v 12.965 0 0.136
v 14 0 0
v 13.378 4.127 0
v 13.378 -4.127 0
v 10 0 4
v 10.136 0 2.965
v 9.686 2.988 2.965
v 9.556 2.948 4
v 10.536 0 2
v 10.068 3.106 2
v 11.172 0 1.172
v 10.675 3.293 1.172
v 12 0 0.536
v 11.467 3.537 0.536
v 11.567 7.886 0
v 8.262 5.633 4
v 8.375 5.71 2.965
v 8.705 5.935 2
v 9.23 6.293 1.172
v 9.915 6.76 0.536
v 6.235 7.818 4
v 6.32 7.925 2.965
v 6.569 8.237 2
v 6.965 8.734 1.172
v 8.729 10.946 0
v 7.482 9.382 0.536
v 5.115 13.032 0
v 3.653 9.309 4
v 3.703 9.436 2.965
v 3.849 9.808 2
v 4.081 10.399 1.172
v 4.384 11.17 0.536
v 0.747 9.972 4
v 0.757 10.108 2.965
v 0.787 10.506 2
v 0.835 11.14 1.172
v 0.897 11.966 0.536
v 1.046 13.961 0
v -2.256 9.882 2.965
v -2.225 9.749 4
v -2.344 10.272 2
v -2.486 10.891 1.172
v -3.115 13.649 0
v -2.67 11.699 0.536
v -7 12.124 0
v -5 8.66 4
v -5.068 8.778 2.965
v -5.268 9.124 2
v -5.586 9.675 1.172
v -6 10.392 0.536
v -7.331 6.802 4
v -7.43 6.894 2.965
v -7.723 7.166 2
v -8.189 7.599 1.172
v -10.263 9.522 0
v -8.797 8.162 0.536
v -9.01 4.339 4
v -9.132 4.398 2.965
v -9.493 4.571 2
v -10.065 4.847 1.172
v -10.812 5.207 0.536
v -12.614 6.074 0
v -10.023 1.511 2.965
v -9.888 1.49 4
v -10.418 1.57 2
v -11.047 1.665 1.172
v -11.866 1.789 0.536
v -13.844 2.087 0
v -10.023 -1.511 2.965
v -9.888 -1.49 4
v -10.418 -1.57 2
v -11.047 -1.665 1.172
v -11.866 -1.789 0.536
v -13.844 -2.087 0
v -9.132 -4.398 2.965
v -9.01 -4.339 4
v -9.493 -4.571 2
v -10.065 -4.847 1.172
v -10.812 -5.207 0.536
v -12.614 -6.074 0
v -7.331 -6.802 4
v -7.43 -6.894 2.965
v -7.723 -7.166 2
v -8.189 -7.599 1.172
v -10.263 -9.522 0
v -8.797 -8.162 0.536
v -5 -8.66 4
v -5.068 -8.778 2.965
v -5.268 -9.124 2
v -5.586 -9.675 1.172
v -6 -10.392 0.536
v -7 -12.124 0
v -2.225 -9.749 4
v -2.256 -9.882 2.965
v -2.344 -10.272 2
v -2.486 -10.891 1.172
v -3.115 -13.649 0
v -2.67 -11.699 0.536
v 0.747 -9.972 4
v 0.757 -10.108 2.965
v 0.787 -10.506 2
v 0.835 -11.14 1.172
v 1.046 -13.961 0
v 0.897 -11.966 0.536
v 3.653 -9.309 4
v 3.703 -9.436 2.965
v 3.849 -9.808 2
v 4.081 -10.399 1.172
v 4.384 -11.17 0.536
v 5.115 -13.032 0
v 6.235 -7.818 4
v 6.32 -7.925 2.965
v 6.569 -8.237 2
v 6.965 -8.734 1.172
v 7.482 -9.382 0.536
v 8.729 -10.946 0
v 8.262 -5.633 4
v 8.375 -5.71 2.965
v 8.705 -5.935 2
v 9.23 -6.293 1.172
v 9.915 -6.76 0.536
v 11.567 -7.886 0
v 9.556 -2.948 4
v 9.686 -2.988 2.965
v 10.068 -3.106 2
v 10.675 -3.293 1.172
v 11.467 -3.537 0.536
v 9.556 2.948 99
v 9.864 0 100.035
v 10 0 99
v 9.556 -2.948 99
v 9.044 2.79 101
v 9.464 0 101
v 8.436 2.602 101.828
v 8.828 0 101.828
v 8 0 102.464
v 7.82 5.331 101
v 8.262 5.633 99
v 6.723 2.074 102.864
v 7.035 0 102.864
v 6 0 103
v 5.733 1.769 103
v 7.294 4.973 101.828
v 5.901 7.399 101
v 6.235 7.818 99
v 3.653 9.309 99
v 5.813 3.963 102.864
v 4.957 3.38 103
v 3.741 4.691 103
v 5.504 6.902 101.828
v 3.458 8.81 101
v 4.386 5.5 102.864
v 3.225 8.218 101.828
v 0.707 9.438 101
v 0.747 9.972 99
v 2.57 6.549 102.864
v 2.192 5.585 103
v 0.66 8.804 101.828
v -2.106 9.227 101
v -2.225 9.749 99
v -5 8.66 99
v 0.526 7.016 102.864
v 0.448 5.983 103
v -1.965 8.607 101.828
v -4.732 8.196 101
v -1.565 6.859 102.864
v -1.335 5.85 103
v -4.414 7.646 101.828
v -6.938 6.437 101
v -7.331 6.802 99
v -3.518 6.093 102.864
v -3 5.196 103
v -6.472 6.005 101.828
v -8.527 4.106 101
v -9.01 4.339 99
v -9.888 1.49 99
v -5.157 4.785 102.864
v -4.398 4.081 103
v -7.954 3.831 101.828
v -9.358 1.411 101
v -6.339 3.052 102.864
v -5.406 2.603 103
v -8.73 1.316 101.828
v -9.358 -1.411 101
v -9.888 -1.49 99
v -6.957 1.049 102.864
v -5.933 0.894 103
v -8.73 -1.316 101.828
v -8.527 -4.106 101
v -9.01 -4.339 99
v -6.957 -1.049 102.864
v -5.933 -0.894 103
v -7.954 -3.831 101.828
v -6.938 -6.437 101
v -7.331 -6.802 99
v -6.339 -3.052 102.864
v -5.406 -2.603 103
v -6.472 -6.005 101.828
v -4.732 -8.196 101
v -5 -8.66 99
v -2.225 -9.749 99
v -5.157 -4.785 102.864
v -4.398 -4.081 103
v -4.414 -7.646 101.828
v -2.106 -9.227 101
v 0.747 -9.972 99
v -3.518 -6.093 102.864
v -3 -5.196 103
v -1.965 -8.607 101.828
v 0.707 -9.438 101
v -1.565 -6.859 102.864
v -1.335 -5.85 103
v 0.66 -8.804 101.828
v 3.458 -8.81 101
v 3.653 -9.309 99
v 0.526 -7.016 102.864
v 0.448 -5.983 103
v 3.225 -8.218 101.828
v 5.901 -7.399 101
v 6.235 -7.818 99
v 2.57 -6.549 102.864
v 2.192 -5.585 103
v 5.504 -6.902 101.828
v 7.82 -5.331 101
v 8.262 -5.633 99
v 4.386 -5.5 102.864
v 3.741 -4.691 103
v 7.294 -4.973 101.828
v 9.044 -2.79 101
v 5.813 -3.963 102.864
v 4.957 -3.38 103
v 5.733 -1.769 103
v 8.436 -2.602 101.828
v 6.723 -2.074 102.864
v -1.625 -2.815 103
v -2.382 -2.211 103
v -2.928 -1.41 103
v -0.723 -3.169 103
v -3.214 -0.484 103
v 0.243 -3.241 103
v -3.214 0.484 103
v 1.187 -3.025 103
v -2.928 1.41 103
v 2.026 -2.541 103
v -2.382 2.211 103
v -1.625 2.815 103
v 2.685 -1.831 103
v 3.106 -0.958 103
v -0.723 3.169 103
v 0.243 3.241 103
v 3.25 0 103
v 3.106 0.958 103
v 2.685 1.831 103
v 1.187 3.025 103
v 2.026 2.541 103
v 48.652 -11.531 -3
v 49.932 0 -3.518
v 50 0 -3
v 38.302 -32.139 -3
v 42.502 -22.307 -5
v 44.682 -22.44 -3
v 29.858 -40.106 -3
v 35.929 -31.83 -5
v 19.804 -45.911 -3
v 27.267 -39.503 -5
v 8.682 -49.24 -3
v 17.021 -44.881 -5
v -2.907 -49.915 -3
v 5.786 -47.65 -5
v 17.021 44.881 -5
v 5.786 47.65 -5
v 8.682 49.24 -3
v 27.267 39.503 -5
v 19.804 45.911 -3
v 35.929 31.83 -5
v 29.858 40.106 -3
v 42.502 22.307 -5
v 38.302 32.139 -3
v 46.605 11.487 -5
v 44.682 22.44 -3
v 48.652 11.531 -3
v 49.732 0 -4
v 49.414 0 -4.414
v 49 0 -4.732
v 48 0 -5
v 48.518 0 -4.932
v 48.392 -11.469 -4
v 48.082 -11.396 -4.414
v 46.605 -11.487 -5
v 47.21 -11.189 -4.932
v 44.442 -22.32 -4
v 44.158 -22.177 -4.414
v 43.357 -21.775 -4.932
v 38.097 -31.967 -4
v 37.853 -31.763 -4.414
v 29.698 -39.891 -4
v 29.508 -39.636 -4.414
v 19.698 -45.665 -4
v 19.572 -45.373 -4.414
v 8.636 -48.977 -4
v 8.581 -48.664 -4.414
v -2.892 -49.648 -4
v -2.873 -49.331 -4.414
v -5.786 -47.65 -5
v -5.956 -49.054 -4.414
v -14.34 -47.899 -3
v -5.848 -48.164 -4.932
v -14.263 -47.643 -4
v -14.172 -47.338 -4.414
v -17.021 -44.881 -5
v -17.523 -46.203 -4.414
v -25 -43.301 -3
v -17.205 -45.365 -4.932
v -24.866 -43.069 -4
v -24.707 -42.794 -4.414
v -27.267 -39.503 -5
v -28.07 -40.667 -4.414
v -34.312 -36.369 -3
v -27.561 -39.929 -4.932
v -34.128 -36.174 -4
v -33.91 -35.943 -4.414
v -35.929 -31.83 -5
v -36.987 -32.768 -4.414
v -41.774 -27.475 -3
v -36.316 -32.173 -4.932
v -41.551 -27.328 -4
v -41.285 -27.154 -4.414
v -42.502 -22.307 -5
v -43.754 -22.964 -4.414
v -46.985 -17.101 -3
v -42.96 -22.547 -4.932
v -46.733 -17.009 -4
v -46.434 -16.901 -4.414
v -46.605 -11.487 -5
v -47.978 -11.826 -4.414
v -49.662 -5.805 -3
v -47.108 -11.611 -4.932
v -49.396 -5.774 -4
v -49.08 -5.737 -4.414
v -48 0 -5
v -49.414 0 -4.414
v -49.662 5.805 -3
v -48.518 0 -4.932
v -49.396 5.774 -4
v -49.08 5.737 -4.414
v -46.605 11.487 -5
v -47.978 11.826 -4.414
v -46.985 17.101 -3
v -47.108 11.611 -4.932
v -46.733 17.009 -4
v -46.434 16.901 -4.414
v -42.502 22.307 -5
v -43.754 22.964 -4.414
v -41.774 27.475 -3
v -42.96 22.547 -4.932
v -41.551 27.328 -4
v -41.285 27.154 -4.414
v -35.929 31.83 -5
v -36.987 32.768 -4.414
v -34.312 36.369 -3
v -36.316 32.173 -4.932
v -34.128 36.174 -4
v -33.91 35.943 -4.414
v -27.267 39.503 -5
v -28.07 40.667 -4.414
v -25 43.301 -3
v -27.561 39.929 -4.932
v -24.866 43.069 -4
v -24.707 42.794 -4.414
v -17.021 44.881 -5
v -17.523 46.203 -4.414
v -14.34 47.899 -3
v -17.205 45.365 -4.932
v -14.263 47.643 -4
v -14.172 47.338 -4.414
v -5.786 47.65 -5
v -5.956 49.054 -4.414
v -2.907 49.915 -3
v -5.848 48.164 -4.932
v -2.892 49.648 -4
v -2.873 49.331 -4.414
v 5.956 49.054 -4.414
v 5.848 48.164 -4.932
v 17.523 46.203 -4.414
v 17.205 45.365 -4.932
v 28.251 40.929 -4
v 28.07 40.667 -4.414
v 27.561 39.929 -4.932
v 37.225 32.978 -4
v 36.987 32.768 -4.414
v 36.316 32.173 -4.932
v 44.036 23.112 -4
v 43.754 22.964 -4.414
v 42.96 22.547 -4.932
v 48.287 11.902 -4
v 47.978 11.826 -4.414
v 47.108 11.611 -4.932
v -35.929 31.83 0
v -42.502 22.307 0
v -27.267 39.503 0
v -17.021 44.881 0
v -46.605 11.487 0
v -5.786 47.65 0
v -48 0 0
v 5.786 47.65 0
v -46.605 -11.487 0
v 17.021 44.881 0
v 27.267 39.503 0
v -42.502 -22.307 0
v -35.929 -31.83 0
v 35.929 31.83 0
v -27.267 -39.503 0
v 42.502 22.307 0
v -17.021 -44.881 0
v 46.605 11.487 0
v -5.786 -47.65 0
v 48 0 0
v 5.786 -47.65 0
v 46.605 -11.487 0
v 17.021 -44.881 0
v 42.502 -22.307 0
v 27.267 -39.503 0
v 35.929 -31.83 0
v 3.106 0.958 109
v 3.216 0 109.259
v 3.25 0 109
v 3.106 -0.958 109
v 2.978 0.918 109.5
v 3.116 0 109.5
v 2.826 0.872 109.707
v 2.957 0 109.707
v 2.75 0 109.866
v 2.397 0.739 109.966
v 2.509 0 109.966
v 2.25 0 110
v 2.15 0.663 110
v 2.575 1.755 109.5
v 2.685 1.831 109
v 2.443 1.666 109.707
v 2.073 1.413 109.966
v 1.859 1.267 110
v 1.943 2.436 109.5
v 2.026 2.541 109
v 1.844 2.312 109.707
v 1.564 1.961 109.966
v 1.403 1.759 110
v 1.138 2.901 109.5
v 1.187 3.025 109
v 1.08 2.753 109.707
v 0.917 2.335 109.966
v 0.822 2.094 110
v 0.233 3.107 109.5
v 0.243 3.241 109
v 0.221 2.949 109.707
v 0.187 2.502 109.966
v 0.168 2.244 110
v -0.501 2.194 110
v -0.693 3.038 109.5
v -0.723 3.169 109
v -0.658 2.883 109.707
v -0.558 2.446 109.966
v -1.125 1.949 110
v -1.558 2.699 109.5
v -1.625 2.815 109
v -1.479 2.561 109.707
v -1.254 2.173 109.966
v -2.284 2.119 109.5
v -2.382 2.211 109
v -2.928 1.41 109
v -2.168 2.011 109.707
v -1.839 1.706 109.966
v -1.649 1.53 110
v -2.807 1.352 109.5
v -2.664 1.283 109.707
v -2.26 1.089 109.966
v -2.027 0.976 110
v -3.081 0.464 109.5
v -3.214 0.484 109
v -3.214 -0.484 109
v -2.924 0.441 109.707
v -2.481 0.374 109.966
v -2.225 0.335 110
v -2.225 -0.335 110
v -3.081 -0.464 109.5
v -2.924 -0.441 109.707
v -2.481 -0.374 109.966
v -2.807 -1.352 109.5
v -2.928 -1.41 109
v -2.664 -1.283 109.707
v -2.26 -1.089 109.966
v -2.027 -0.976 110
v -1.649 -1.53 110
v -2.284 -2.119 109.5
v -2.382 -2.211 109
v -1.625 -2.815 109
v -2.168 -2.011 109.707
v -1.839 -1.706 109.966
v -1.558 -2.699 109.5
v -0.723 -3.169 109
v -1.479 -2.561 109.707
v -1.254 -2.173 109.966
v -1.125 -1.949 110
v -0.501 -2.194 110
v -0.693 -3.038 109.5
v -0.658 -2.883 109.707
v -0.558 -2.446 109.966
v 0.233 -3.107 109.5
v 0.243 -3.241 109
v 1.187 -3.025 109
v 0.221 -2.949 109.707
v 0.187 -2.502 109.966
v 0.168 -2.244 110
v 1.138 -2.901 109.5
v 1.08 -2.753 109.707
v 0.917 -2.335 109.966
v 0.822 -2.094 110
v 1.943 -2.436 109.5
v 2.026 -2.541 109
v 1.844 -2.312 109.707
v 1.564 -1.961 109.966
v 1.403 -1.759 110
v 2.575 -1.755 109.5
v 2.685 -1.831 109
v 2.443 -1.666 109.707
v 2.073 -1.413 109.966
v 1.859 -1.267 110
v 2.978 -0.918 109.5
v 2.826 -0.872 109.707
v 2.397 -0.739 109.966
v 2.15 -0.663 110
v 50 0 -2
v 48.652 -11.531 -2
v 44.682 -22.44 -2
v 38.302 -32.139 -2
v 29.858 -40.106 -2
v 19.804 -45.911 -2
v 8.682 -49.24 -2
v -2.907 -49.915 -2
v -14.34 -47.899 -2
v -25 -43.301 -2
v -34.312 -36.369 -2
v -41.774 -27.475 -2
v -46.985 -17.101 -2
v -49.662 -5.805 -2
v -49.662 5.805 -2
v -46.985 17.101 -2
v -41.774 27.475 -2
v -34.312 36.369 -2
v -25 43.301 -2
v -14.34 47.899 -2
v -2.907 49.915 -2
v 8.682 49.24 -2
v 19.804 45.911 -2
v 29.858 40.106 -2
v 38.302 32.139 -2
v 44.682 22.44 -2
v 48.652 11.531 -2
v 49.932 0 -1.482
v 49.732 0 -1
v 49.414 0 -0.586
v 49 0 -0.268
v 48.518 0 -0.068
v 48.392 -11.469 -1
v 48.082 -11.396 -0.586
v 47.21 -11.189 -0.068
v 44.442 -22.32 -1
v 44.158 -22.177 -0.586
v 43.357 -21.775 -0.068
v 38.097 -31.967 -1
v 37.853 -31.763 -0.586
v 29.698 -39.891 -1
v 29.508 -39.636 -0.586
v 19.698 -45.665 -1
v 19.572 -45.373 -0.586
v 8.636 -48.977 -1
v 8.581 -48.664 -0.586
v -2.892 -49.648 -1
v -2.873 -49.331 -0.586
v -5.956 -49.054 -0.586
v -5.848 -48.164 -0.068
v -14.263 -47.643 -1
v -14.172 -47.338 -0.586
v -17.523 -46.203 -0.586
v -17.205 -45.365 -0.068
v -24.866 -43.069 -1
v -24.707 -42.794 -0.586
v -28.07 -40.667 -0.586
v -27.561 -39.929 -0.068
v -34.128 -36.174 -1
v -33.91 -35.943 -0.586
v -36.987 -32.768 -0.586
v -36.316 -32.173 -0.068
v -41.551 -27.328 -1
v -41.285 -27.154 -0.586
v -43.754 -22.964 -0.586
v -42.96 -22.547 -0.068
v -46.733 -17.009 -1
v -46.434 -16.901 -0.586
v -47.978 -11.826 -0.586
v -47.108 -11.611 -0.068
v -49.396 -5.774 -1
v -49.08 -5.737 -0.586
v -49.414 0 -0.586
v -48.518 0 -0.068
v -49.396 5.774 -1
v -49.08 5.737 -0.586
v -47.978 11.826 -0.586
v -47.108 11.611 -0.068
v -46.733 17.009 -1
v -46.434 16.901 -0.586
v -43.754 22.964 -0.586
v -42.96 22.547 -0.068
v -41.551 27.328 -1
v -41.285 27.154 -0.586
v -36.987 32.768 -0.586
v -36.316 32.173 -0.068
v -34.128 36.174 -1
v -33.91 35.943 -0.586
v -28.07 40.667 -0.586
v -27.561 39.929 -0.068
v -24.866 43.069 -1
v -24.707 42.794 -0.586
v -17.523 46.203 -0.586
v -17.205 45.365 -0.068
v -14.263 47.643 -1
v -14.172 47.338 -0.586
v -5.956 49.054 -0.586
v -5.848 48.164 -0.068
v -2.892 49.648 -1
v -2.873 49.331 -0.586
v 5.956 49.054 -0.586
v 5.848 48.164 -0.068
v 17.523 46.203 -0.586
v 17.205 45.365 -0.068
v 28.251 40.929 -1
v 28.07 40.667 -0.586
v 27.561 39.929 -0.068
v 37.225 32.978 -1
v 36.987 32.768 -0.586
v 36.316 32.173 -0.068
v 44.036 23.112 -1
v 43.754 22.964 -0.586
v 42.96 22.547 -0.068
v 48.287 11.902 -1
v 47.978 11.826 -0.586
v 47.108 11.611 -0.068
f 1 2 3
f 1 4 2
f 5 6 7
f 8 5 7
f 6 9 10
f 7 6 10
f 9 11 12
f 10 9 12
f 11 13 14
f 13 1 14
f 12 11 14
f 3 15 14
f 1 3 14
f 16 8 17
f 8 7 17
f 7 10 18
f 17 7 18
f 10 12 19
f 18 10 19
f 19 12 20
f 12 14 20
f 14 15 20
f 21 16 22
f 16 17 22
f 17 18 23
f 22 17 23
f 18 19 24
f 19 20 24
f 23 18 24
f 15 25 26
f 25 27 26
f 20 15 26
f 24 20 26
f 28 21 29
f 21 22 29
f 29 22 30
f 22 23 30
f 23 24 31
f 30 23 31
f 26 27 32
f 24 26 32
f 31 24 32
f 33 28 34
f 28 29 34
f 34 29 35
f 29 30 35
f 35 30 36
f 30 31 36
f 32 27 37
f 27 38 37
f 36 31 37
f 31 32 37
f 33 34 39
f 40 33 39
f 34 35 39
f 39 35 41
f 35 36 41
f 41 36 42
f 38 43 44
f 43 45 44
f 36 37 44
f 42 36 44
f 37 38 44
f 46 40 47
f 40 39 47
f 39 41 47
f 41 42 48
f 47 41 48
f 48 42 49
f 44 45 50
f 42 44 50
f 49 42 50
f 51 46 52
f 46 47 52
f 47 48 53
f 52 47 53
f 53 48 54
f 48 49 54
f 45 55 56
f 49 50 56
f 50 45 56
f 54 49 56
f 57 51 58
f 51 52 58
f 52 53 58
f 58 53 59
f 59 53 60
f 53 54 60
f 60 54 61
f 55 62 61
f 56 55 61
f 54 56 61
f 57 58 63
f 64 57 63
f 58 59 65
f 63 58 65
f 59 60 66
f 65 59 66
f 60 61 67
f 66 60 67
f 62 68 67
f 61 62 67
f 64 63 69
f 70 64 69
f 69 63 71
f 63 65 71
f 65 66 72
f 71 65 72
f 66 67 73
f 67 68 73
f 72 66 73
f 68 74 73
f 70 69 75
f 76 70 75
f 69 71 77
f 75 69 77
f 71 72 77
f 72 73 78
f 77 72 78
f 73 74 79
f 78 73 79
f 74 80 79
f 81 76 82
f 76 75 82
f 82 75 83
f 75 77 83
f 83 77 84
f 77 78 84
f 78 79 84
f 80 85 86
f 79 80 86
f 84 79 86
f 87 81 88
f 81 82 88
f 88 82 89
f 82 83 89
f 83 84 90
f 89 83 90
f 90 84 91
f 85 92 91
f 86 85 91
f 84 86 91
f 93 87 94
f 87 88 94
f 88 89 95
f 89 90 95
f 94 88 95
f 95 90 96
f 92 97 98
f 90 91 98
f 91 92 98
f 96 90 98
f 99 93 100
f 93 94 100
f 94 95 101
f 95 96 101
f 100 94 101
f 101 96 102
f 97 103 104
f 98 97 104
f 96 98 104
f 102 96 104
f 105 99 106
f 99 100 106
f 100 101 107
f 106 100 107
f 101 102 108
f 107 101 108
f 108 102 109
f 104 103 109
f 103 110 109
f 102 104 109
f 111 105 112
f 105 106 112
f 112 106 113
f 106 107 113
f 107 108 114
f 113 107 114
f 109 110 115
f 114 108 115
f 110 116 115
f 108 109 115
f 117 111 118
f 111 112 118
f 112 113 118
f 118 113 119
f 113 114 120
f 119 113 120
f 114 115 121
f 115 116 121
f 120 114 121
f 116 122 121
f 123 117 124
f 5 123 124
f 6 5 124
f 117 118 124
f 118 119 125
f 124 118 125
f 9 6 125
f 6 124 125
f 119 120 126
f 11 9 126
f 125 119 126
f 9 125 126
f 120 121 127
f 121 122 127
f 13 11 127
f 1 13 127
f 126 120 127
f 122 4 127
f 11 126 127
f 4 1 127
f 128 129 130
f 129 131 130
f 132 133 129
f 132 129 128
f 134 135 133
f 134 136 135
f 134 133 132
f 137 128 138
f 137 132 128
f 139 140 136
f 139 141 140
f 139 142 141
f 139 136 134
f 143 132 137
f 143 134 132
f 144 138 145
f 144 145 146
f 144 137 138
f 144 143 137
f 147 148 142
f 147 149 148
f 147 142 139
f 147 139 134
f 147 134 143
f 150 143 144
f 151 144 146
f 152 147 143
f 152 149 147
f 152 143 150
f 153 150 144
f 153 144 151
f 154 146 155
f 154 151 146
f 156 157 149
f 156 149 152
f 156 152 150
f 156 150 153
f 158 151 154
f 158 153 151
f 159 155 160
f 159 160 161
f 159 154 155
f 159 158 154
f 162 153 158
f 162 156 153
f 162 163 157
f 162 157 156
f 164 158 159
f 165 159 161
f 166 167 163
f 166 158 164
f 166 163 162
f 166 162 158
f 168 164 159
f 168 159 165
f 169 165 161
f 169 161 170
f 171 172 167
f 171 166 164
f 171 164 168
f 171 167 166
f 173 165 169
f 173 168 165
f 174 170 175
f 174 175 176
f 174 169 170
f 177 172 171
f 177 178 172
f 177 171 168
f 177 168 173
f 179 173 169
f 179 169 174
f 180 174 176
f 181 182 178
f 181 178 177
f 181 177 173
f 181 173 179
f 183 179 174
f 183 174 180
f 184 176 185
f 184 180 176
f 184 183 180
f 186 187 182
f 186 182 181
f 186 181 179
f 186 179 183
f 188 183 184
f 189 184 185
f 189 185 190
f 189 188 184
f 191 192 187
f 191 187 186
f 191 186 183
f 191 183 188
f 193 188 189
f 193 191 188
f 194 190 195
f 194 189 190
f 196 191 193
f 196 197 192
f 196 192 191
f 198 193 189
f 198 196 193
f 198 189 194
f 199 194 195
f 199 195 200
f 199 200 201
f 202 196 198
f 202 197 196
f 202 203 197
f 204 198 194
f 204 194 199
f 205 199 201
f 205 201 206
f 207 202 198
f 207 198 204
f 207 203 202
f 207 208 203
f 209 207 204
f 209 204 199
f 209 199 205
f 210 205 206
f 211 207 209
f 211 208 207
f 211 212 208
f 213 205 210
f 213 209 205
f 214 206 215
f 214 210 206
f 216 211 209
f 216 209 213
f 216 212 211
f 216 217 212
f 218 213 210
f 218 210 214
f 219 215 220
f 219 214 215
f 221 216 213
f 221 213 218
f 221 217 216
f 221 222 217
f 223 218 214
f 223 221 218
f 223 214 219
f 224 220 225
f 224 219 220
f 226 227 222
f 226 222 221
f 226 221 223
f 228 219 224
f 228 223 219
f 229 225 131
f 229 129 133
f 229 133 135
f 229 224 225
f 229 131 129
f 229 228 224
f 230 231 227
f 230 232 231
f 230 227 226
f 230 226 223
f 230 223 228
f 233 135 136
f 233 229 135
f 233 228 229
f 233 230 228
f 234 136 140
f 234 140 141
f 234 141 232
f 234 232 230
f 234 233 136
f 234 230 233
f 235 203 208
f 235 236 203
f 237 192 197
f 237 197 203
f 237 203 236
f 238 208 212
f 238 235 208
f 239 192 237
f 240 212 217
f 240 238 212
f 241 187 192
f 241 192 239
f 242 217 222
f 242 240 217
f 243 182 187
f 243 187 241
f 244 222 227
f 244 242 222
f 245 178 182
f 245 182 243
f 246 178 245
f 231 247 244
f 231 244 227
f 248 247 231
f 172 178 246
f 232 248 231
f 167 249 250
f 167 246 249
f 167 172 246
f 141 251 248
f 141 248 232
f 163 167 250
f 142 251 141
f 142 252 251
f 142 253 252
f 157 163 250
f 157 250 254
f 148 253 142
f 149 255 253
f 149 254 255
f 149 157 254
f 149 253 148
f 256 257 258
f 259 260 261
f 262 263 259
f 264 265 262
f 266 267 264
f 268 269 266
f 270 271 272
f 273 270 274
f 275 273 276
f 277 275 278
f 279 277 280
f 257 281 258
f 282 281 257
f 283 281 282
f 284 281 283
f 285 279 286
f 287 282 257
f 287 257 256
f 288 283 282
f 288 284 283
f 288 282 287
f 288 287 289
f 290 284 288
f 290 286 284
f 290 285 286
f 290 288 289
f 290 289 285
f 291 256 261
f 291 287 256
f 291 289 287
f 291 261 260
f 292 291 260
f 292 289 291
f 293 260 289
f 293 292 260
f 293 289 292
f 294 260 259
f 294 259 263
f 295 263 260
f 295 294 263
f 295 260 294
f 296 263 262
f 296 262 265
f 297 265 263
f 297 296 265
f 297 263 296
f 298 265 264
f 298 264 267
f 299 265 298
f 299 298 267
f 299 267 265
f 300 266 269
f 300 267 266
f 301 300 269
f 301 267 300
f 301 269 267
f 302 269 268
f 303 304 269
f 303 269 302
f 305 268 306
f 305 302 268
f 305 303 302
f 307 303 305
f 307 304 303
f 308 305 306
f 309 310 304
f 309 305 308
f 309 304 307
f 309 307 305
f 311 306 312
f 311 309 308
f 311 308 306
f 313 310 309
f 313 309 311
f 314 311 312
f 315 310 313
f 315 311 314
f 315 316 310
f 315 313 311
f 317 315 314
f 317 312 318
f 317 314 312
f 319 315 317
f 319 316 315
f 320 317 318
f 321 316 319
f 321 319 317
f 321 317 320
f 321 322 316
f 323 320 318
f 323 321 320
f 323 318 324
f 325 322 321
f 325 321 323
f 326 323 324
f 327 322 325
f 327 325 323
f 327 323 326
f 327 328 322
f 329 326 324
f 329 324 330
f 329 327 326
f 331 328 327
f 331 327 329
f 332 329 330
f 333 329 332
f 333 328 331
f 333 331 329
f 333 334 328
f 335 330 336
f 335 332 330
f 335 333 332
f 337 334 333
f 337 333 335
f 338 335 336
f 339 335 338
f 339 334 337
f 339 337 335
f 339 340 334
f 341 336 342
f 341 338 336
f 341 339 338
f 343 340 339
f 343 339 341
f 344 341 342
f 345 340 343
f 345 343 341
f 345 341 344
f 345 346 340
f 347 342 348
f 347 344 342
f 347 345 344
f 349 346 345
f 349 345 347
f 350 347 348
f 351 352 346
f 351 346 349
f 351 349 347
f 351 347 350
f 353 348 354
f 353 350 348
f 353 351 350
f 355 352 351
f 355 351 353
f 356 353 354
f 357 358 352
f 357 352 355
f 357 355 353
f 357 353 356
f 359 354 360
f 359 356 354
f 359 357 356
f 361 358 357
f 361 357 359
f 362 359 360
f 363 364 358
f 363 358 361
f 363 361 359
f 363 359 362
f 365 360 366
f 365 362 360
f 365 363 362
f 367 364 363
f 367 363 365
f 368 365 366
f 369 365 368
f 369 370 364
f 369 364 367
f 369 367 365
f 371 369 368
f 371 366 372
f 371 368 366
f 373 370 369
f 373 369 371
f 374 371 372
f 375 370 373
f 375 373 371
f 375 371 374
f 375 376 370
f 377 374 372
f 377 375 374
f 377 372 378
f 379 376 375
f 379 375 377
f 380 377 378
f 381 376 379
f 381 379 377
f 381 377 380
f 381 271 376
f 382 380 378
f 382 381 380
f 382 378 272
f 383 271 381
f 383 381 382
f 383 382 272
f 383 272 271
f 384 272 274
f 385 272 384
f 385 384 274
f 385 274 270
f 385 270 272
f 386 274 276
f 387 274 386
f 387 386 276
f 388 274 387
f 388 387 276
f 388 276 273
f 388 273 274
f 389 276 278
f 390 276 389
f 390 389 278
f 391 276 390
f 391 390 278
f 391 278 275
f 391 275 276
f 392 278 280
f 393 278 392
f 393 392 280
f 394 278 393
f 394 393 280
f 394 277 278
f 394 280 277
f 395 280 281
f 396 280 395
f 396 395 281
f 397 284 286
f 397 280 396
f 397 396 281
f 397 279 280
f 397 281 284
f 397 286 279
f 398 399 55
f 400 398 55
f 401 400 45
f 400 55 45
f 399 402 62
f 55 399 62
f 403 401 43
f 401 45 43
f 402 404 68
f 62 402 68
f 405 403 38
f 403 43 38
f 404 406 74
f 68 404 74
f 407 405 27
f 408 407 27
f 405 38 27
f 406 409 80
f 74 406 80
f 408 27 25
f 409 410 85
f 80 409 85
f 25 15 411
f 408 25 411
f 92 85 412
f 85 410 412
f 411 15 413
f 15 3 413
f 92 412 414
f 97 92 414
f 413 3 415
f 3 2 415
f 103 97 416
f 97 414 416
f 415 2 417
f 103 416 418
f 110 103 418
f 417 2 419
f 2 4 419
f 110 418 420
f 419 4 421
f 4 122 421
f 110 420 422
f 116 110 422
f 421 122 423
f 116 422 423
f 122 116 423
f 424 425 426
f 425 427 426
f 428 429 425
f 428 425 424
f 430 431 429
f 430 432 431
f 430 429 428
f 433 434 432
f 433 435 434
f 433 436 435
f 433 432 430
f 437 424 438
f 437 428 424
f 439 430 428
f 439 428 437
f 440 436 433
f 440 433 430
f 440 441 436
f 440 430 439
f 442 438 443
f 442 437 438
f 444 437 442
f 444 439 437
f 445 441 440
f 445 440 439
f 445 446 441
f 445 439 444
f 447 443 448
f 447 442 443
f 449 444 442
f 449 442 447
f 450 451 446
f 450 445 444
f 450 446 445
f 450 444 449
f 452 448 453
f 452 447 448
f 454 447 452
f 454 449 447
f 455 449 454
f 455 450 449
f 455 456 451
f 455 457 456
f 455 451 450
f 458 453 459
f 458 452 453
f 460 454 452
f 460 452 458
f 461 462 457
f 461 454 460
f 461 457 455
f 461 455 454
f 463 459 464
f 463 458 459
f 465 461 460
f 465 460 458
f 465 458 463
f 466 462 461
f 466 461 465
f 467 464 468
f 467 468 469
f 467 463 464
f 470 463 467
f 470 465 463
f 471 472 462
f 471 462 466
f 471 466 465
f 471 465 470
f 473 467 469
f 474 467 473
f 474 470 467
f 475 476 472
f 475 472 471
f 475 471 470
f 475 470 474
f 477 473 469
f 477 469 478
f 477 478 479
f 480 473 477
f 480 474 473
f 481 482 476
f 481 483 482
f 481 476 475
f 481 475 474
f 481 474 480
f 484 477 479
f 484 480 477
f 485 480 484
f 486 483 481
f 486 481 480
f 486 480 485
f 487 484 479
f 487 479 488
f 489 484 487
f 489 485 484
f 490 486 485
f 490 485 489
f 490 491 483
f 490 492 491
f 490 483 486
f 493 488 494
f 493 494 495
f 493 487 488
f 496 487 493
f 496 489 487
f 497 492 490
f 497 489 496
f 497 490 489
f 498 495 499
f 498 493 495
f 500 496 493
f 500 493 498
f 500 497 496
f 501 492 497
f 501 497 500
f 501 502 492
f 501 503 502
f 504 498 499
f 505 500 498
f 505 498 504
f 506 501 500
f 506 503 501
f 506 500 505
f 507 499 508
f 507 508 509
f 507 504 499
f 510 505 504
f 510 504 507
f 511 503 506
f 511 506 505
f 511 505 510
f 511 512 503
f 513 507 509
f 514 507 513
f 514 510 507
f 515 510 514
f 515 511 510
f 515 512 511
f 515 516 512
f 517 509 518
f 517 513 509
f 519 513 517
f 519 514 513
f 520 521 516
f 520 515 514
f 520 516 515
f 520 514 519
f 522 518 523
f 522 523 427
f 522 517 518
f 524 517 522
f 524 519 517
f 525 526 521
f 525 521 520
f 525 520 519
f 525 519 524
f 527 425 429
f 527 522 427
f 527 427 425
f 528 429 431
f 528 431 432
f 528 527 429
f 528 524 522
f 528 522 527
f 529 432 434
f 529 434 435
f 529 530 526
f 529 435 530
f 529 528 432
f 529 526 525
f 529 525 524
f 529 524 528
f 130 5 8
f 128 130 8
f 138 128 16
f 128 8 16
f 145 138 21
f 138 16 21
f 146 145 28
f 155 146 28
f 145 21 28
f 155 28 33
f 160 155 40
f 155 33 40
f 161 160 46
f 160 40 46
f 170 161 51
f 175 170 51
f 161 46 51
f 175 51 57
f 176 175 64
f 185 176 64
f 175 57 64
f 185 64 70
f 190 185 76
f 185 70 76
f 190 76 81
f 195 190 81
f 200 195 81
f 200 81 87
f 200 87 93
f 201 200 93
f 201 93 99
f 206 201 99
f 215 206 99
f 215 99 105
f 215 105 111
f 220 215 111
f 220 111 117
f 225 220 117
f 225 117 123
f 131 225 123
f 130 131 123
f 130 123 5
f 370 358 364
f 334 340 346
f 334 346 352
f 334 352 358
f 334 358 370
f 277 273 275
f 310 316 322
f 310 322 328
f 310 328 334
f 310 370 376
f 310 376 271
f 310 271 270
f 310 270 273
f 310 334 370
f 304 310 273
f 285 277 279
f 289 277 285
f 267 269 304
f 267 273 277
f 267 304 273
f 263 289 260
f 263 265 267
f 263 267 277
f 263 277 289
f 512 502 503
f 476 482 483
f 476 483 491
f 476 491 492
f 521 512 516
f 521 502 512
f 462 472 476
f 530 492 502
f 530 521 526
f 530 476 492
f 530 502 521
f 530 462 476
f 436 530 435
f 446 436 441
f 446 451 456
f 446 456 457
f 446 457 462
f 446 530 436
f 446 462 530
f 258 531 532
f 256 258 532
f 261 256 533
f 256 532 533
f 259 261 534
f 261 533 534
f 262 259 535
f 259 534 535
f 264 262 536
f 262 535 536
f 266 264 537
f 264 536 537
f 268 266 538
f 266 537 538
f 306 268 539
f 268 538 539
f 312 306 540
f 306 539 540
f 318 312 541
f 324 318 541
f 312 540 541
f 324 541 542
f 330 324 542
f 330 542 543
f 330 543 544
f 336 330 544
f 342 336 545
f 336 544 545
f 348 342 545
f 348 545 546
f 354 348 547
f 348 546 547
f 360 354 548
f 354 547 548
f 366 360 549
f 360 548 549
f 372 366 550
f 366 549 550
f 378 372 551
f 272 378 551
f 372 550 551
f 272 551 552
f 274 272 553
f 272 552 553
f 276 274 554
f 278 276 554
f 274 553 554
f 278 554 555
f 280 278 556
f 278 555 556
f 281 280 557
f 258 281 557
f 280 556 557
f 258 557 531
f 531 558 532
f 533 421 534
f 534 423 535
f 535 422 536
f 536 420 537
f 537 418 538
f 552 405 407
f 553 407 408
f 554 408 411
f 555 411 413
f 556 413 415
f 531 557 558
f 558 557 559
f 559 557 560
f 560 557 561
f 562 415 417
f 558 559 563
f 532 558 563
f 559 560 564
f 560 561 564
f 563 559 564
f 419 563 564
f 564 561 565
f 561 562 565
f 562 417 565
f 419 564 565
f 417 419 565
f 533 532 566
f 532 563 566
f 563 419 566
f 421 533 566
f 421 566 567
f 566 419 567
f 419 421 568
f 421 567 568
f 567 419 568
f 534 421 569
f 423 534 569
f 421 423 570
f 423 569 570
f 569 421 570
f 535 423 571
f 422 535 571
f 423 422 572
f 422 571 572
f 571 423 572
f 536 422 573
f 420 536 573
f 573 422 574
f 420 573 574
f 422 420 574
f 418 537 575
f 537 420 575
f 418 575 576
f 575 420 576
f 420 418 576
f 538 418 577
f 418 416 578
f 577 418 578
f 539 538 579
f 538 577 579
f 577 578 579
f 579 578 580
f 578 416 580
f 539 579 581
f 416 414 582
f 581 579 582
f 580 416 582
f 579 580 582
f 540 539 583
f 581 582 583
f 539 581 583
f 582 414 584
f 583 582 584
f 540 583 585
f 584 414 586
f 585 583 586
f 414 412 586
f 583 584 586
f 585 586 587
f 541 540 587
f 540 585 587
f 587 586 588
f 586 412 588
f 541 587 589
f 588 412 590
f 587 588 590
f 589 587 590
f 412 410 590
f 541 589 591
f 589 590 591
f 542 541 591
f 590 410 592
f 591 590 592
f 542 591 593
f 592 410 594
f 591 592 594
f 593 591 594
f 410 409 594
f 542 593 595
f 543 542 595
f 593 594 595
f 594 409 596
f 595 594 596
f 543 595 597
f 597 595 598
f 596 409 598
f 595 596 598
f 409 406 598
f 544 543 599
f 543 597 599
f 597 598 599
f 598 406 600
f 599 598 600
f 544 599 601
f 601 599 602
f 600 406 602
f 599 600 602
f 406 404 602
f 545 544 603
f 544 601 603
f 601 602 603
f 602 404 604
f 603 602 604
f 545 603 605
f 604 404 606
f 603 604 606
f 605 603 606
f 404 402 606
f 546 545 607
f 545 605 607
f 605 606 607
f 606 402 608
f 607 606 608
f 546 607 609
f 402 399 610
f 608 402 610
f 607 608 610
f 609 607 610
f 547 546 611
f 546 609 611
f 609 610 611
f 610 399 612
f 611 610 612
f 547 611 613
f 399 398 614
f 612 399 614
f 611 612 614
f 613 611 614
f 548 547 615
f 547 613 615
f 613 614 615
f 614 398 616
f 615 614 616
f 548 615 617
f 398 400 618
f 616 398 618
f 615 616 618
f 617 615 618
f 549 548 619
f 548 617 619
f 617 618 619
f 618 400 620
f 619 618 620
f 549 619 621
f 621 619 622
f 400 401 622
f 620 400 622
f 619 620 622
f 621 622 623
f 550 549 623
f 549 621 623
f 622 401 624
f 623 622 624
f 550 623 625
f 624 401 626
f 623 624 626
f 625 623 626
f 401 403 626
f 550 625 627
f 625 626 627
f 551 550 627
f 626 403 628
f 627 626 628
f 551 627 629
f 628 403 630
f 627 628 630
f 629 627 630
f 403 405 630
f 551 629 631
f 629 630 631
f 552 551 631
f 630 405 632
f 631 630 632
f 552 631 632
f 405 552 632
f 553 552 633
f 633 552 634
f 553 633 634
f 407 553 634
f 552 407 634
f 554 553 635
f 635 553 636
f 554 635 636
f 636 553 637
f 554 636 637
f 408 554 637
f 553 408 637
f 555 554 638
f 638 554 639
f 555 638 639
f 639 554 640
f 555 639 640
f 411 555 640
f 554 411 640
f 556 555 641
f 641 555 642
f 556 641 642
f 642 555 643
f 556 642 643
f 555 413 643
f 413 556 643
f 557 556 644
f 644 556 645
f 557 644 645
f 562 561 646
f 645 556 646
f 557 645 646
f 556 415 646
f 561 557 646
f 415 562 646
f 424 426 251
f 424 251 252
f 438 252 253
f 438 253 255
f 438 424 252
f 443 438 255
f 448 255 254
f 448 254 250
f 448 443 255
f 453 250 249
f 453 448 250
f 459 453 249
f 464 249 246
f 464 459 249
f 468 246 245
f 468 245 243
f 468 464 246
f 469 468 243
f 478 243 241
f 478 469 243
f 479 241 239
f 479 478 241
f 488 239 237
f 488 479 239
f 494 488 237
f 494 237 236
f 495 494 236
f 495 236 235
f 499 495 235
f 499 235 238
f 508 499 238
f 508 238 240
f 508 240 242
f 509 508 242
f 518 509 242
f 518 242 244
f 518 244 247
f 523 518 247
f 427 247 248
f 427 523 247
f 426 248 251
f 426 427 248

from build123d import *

# Parameters (mm, degrees)
SKETCH_R      = 10
PAD_DEPTH     = 110
SKETCH001_R   = 10
SKETCH001_R_2 = 3.25
POCKET_DEPTH  = 7
SKETCH002_R   = 50
PAD001_DEPTH  = 5
FILLET_R      = 2
FILLET001_R   = 4
FILLET002_R   = 1
FILLET003_R   = 4


with BuildPart() as part:
    # Sketch → Pad (new body)
    with BuildSketch(Plane.XY):
        Circle(SKETCH_R)
    extrude(amount=PAD_DEPTH)

    # Sketch001 (on Face3 of Pad) → Pocket (cut)
    with BuildSketch(Plane.XY.offset(110)):
        Circle(SKETCH001_R)
        Circle(SKETCH001_R_2, mode=Mode.SUBTRACT)
    extrude(amount=-POCKET_DEPTH, mode=Mode.SUBTRACT)

    # Sketch002 (on Face2 of Pocket) → Pad001 (join)
    with BuildSketch(Plane(origin=(0, 0, 0), x_dir=(1, 0, 0), z_dir=(0, 0, -1))):
        Circle(SKETCH002_R)
    extrude(amount=PAD001_DEPTH)

    # Fillet
    fillet_edges = [part.edges().sort_by_distance(p)[0] for p in [
        (-50, 0, -5),
        (-50, 0, 0),
    ]]
    fillet(fillet_edges, radius=FILLET_R)

    # Fillet001
    fillet001_edges = [part.edges().sort_by_distance(p)[0] for p in [
        (-10, 0, 103),
    ]]
    fillet(fillet001_edges, radius=FILLET001_R)

    # Fillet002
    fillet002_edges = [part.edges().sort_by_distance(p)[0] for p in [
        (-3.25, 0, 110),
    ]]
    fillet(fillet002_edges, radius=FILLET002_R)

    # Fillet003
    fillet003_edges = [part.edges().sort_by_distance(p)[0] for p in [
        (-10, 0, 0),
    ]]
    fillet(fillet003_edges, radius=FILLET003_R)


solid = part.part
